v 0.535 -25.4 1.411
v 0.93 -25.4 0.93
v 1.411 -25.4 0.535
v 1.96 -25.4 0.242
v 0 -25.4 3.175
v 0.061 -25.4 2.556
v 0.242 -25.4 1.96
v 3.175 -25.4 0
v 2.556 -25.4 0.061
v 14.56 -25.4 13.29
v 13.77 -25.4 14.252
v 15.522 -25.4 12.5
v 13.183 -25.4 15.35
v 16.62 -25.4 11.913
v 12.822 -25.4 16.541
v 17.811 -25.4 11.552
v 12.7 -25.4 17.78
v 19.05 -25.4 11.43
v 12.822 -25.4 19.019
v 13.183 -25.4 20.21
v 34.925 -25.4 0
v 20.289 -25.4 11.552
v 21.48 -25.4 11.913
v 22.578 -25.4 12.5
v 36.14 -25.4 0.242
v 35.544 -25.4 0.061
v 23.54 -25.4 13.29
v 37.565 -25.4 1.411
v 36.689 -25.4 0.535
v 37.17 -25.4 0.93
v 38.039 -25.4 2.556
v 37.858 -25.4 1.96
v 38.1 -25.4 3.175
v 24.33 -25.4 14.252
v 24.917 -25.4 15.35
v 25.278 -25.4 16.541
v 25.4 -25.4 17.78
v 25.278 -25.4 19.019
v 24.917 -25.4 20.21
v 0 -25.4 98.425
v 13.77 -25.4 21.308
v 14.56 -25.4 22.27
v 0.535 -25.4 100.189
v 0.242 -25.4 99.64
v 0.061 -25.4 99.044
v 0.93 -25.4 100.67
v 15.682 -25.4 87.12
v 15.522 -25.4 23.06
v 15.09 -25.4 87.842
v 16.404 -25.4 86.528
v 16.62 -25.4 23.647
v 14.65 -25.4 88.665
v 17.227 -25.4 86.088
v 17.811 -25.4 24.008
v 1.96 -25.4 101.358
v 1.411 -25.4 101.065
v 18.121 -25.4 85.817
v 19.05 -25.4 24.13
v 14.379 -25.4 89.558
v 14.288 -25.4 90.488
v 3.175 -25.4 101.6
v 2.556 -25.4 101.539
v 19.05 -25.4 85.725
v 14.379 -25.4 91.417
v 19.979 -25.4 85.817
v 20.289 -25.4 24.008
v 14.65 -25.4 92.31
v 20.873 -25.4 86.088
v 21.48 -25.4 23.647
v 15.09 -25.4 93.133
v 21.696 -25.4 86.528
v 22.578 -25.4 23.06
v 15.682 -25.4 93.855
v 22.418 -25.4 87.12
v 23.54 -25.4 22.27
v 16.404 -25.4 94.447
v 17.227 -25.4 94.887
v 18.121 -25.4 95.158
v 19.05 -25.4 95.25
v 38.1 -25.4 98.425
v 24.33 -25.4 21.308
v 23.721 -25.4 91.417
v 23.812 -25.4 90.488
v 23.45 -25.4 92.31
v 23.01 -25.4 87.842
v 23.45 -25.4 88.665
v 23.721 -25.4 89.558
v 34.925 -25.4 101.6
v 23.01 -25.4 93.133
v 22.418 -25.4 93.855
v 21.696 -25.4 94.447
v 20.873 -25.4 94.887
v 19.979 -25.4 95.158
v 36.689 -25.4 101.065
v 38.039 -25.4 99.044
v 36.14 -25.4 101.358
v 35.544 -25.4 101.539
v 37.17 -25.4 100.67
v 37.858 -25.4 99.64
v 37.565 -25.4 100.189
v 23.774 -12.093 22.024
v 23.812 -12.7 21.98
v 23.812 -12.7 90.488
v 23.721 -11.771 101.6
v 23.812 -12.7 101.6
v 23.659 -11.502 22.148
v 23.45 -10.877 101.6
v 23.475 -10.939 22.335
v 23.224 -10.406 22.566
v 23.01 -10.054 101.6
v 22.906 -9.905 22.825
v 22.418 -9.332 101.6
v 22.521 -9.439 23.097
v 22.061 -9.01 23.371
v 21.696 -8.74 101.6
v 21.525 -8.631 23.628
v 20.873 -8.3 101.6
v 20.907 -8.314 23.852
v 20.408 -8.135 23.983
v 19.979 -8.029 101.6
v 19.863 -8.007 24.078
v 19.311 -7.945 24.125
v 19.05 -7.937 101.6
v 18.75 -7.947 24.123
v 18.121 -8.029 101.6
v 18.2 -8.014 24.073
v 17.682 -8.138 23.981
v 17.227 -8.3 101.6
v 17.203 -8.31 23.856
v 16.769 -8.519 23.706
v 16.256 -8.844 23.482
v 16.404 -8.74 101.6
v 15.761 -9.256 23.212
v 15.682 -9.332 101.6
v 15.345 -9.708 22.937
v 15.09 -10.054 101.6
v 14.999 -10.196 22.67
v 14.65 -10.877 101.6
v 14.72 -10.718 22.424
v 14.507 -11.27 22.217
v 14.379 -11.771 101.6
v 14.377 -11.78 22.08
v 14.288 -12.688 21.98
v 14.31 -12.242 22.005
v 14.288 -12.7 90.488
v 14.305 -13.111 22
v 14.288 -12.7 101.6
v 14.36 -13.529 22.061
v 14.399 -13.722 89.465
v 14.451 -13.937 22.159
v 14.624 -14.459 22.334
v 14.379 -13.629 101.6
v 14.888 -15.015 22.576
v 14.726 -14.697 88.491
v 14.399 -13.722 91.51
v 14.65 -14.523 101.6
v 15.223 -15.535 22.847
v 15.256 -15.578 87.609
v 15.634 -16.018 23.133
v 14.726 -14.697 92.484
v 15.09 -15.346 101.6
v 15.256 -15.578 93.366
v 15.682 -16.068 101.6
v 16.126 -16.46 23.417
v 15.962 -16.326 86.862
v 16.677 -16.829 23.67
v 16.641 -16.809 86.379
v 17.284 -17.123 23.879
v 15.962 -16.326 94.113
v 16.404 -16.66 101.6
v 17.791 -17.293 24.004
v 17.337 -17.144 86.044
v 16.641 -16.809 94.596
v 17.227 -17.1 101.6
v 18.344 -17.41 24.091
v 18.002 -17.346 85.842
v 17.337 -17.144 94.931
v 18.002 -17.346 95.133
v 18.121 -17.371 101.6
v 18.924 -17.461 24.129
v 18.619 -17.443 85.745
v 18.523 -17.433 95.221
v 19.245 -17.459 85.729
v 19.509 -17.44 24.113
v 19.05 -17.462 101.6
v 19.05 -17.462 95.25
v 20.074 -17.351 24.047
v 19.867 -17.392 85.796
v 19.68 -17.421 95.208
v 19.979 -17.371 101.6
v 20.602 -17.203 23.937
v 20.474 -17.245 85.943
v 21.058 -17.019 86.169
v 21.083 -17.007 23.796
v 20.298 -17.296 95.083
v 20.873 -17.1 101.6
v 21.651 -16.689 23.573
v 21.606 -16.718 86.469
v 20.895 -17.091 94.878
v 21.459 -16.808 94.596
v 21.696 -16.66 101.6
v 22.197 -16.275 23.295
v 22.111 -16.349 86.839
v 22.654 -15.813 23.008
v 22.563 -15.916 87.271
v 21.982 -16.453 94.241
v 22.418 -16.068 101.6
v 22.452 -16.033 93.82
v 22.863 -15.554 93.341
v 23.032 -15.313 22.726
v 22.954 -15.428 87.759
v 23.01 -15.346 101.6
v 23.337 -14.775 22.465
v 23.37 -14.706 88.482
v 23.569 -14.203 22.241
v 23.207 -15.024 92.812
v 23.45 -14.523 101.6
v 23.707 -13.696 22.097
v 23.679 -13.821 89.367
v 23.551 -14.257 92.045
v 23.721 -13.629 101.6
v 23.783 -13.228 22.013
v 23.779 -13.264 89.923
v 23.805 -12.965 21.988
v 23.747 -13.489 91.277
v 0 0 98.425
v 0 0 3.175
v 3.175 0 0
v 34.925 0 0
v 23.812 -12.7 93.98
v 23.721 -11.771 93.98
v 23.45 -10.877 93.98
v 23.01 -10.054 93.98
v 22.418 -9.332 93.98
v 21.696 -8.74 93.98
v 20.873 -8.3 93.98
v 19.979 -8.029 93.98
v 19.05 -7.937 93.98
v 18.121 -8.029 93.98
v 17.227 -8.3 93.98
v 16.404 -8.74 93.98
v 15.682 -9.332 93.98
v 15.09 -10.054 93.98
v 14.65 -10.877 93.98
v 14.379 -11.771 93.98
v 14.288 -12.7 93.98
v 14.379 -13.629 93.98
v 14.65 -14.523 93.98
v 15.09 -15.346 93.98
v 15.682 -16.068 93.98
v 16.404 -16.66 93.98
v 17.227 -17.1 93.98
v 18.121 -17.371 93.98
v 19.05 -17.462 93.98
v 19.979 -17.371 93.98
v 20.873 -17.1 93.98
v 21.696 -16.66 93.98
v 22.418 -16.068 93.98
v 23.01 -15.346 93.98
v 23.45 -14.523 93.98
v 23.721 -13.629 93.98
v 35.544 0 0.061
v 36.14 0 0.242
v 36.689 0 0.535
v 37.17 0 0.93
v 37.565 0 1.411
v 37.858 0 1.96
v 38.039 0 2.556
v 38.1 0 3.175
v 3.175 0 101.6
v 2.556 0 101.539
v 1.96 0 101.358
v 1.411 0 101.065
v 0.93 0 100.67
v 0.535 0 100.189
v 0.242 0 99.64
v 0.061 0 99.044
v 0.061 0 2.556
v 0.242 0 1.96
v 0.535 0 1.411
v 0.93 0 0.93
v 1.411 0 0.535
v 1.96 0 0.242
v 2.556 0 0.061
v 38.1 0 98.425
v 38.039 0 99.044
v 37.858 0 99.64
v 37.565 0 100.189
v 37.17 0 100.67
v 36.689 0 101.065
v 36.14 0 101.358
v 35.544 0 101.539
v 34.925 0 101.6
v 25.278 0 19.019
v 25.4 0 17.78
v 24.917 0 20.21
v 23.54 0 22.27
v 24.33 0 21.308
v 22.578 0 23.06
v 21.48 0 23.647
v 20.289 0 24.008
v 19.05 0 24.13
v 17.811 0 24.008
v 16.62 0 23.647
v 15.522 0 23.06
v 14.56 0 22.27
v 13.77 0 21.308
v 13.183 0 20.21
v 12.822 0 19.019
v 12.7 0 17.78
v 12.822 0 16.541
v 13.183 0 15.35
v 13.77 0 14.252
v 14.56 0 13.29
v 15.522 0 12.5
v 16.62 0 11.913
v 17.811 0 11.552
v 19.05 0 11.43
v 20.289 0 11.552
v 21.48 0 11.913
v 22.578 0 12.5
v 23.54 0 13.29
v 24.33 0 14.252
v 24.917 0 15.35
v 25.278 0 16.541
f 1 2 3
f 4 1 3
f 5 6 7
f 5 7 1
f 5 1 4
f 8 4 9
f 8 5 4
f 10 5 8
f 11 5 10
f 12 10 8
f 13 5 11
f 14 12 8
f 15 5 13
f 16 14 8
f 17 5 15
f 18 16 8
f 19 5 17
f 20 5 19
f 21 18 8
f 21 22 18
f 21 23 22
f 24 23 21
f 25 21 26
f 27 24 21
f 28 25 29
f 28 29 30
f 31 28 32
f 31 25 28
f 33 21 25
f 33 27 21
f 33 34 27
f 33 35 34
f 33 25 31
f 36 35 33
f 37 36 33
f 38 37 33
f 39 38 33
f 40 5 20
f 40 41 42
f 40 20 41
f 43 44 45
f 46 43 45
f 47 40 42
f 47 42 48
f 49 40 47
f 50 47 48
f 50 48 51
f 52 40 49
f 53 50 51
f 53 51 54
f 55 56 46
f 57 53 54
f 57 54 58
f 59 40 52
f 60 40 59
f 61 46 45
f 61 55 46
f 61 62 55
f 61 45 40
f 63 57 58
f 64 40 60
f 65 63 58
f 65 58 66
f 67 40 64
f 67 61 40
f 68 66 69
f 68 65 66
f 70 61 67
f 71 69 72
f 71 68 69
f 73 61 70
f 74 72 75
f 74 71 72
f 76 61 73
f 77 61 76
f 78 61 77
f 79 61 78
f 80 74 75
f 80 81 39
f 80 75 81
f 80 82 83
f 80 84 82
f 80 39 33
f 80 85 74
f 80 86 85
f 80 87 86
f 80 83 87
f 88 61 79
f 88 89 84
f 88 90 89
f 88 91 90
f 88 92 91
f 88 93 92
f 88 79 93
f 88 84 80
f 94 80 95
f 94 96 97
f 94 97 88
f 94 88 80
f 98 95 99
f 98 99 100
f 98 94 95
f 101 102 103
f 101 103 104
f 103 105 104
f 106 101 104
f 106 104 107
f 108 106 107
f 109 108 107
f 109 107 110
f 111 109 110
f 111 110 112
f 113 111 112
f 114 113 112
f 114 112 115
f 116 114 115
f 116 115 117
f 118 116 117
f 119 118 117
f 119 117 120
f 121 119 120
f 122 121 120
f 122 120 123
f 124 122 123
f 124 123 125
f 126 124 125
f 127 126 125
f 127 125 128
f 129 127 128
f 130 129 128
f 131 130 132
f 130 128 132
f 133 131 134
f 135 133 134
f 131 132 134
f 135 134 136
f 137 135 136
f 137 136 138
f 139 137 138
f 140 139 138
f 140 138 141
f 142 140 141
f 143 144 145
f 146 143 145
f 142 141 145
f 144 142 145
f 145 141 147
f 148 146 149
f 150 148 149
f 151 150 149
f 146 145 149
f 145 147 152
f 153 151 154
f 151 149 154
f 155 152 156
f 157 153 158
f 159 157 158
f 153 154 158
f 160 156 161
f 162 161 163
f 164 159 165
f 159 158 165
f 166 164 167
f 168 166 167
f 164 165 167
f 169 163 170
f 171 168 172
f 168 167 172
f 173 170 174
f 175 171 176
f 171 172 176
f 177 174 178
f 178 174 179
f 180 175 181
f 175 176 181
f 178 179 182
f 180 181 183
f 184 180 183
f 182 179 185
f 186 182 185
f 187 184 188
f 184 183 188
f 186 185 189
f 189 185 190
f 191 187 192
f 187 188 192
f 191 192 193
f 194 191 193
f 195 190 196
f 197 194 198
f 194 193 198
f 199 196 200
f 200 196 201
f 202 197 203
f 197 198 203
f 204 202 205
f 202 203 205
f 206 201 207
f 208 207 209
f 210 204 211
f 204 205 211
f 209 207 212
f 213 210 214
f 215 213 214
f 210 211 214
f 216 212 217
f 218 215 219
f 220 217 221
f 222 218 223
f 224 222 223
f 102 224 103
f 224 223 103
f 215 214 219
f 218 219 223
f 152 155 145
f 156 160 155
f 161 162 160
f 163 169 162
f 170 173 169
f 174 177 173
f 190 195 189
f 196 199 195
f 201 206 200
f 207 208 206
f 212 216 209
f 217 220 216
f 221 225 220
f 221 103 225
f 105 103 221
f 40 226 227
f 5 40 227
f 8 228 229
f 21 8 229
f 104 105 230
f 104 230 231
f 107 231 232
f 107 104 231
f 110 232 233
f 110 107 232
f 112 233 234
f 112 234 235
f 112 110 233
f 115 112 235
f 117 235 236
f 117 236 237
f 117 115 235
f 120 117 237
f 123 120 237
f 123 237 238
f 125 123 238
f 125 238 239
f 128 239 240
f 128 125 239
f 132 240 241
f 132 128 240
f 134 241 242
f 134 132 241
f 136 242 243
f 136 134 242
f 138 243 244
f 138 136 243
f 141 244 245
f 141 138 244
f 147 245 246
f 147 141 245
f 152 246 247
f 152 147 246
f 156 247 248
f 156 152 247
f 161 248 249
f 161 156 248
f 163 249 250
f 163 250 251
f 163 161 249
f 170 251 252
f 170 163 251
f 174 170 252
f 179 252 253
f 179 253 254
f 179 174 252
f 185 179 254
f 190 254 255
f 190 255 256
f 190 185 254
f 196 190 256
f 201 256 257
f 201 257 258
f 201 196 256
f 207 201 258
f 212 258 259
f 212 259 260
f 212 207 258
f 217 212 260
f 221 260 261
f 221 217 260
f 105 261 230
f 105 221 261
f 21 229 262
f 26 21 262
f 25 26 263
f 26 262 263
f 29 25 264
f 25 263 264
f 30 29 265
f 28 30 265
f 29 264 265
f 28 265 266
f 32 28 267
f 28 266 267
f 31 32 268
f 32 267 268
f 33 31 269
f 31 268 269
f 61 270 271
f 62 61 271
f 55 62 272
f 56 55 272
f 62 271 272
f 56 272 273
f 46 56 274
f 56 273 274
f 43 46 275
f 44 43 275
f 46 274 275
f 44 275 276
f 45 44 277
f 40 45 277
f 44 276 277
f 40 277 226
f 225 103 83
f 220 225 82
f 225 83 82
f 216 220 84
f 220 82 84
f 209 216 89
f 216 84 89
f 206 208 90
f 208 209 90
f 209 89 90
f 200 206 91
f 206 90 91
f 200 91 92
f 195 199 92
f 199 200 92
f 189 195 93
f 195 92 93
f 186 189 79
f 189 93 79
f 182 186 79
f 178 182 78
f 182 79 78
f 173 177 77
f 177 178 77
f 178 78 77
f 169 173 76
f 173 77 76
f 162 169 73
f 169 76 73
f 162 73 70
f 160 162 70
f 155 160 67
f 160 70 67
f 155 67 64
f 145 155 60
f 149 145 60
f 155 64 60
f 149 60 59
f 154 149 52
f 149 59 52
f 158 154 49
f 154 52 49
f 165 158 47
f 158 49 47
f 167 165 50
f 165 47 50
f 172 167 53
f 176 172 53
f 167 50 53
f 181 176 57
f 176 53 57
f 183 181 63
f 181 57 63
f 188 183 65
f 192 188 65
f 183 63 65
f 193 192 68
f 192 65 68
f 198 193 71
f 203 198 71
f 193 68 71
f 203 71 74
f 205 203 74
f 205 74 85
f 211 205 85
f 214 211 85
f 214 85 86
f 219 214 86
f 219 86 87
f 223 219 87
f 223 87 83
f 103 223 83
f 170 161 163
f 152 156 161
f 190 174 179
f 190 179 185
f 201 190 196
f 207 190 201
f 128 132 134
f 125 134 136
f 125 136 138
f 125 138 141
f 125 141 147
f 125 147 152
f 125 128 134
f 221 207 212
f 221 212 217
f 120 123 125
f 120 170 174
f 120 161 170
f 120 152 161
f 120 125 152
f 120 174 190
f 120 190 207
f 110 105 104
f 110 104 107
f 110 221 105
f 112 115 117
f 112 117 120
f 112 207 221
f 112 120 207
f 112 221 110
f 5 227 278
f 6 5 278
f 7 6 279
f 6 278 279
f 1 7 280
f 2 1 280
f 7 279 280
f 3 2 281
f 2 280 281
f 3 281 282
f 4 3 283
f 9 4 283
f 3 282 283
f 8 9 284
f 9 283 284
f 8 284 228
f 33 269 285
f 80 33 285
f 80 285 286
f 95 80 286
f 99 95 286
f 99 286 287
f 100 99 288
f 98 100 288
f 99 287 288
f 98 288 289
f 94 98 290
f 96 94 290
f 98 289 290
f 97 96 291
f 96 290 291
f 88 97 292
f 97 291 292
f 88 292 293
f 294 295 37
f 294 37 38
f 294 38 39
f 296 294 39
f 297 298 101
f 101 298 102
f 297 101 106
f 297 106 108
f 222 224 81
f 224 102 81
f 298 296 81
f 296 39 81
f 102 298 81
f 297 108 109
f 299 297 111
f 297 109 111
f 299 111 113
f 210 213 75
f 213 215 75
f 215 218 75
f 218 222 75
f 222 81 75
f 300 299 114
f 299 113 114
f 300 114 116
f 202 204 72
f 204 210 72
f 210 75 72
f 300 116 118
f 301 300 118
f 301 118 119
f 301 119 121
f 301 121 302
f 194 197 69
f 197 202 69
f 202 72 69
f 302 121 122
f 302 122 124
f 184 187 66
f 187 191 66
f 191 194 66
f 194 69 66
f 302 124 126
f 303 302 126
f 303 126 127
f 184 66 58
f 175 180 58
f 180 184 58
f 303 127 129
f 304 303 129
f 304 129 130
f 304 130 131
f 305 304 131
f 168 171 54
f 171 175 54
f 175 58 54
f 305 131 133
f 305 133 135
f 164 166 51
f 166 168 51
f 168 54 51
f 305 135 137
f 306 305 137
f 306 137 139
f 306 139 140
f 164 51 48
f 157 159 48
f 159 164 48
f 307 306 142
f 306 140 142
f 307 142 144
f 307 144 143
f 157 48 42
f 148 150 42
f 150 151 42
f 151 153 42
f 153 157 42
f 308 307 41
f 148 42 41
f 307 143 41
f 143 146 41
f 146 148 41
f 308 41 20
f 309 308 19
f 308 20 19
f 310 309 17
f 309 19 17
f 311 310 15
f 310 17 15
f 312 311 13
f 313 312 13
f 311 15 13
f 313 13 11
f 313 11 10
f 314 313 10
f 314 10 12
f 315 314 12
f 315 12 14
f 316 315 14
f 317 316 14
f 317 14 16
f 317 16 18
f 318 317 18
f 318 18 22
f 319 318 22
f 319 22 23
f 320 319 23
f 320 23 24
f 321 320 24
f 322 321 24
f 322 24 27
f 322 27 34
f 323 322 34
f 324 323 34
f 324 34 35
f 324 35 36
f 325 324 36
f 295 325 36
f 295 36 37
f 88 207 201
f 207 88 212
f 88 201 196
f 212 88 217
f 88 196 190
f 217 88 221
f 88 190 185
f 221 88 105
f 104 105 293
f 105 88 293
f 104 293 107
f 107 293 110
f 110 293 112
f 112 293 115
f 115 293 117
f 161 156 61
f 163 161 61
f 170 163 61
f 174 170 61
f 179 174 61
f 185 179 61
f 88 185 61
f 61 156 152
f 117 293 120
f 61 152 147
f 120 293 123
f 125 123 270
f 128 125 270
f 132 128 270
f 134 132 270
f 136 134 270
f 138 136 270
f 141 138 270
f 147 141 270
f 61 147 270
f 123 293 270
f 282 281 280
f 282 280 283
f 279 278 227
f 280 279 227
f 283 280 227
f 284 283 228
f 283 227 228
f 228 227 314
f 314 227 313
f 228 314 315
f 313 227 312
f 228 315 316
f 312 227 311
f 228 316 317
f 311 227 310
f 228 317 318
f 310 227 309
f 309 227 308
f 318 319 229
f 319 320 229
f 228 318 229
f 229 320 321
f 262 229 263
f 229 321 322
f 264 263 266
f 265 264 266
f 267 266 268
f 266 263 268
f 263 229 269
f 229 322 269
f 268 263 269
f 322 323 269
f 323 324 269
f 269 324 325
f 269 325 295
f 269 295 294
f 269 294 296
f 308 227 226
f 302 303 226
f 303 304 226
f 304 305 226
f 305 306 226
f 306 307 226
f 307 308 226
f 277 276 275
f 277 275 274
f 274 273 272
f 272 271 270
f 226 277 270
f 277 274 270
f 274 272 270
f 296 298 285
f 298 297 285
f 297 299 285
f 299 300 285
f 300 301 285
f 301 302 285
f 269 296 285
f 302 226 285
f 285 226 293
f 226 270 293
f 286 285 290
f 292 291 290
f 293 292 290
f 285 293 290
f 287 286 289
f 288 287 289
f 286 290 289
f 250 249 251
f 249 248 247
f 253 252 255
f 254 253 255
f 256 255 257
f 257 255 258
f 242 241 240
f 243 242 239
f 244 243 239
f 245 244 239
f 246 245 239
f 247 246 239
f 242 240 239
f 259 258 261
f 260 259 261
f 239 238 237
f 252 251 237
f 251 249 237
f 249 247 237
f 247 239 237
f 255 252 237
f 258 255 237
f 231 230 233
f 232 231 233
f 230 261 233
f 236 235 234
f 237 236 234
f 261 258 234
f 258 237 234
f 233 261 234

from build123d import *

# Parameters (mm, degrees)
F1_DEPTH = 25.4
F2_R     = 6.35
F3_DEPTH = 127
F4_R     = 4.7625
F5_DEPTH = 81.28
F7_R     = 4.7625
F8_DEPTH = 7.62
F6_R     = 4.7625
F9_DEPTH = 12.7


with BuildPart() as f1:
    # F0 (on Front) → F1 (new body)
    with BuildSketch(Plane.XZ):
        with BuildLine():
            ThreePointArc((0, 3.175), (0.9299359697, 0.9299359697), (3.175, 0))
            Line((3.175, 0), (34.925, 0))
            ThreePointArc((34.925, 0), (37.1700640303, 0.9299359697), (38.1, 3.175))
            Line((38.1, 3.175), (38.1, 98.425))
            ThreePointArc((38.1, 98.425), (37.1700640303, 100.6700640303), (34.925, 101.6))
            Line((34.925, 101.6), (3.175, 101.6))
            ThreePointArc((3.175, 101.6), (0.9299359697, 100.6700640303), (0, 98.425))
            Line((0, 98.425), (0, 3.175))
        make_face()
    extrude(amount=F1_DEPTH)

    # F2 (on face) → F3 (cut)
    with BuildSketch(Plane.XZ.offset(25.4)):
        with Locations((19.05, 17.78)):
            Circle(F2_R)
    extrude(amount=-F3_DEPTH, mode=Mode.SUBTRACT)

    # F4 (on face) → F5 (cut)
    with BuildSketch(Plane.XY.offset(101.6)):
        with Locations((19.05, -12.7)):
            Circle(F4_R)
    extrude(amount=-F5_DEPTH, mode=Mode.SUBTRACT)

    # F6 (on face) → F9 (cut)
    with BuildSketch(Plane.XZ.offset(25.4)):
        with Locations((19.05, 90.4875)):
            Circle(F6_R)
    extrude(amount=-F9_DEPTH, mode=Mode.SUBTRACT)


with BuildPart() as f8:
    # F7 (on face) → F8 (new body)
    with BuildSketch(Plane.XY.offset(101.6)):
        with Locations((19.05, -12.7)):
            Circle(F7_R)
    extrude(amount=-F8_DEPTH)


solid = Compound([f1.part, f8.part])
